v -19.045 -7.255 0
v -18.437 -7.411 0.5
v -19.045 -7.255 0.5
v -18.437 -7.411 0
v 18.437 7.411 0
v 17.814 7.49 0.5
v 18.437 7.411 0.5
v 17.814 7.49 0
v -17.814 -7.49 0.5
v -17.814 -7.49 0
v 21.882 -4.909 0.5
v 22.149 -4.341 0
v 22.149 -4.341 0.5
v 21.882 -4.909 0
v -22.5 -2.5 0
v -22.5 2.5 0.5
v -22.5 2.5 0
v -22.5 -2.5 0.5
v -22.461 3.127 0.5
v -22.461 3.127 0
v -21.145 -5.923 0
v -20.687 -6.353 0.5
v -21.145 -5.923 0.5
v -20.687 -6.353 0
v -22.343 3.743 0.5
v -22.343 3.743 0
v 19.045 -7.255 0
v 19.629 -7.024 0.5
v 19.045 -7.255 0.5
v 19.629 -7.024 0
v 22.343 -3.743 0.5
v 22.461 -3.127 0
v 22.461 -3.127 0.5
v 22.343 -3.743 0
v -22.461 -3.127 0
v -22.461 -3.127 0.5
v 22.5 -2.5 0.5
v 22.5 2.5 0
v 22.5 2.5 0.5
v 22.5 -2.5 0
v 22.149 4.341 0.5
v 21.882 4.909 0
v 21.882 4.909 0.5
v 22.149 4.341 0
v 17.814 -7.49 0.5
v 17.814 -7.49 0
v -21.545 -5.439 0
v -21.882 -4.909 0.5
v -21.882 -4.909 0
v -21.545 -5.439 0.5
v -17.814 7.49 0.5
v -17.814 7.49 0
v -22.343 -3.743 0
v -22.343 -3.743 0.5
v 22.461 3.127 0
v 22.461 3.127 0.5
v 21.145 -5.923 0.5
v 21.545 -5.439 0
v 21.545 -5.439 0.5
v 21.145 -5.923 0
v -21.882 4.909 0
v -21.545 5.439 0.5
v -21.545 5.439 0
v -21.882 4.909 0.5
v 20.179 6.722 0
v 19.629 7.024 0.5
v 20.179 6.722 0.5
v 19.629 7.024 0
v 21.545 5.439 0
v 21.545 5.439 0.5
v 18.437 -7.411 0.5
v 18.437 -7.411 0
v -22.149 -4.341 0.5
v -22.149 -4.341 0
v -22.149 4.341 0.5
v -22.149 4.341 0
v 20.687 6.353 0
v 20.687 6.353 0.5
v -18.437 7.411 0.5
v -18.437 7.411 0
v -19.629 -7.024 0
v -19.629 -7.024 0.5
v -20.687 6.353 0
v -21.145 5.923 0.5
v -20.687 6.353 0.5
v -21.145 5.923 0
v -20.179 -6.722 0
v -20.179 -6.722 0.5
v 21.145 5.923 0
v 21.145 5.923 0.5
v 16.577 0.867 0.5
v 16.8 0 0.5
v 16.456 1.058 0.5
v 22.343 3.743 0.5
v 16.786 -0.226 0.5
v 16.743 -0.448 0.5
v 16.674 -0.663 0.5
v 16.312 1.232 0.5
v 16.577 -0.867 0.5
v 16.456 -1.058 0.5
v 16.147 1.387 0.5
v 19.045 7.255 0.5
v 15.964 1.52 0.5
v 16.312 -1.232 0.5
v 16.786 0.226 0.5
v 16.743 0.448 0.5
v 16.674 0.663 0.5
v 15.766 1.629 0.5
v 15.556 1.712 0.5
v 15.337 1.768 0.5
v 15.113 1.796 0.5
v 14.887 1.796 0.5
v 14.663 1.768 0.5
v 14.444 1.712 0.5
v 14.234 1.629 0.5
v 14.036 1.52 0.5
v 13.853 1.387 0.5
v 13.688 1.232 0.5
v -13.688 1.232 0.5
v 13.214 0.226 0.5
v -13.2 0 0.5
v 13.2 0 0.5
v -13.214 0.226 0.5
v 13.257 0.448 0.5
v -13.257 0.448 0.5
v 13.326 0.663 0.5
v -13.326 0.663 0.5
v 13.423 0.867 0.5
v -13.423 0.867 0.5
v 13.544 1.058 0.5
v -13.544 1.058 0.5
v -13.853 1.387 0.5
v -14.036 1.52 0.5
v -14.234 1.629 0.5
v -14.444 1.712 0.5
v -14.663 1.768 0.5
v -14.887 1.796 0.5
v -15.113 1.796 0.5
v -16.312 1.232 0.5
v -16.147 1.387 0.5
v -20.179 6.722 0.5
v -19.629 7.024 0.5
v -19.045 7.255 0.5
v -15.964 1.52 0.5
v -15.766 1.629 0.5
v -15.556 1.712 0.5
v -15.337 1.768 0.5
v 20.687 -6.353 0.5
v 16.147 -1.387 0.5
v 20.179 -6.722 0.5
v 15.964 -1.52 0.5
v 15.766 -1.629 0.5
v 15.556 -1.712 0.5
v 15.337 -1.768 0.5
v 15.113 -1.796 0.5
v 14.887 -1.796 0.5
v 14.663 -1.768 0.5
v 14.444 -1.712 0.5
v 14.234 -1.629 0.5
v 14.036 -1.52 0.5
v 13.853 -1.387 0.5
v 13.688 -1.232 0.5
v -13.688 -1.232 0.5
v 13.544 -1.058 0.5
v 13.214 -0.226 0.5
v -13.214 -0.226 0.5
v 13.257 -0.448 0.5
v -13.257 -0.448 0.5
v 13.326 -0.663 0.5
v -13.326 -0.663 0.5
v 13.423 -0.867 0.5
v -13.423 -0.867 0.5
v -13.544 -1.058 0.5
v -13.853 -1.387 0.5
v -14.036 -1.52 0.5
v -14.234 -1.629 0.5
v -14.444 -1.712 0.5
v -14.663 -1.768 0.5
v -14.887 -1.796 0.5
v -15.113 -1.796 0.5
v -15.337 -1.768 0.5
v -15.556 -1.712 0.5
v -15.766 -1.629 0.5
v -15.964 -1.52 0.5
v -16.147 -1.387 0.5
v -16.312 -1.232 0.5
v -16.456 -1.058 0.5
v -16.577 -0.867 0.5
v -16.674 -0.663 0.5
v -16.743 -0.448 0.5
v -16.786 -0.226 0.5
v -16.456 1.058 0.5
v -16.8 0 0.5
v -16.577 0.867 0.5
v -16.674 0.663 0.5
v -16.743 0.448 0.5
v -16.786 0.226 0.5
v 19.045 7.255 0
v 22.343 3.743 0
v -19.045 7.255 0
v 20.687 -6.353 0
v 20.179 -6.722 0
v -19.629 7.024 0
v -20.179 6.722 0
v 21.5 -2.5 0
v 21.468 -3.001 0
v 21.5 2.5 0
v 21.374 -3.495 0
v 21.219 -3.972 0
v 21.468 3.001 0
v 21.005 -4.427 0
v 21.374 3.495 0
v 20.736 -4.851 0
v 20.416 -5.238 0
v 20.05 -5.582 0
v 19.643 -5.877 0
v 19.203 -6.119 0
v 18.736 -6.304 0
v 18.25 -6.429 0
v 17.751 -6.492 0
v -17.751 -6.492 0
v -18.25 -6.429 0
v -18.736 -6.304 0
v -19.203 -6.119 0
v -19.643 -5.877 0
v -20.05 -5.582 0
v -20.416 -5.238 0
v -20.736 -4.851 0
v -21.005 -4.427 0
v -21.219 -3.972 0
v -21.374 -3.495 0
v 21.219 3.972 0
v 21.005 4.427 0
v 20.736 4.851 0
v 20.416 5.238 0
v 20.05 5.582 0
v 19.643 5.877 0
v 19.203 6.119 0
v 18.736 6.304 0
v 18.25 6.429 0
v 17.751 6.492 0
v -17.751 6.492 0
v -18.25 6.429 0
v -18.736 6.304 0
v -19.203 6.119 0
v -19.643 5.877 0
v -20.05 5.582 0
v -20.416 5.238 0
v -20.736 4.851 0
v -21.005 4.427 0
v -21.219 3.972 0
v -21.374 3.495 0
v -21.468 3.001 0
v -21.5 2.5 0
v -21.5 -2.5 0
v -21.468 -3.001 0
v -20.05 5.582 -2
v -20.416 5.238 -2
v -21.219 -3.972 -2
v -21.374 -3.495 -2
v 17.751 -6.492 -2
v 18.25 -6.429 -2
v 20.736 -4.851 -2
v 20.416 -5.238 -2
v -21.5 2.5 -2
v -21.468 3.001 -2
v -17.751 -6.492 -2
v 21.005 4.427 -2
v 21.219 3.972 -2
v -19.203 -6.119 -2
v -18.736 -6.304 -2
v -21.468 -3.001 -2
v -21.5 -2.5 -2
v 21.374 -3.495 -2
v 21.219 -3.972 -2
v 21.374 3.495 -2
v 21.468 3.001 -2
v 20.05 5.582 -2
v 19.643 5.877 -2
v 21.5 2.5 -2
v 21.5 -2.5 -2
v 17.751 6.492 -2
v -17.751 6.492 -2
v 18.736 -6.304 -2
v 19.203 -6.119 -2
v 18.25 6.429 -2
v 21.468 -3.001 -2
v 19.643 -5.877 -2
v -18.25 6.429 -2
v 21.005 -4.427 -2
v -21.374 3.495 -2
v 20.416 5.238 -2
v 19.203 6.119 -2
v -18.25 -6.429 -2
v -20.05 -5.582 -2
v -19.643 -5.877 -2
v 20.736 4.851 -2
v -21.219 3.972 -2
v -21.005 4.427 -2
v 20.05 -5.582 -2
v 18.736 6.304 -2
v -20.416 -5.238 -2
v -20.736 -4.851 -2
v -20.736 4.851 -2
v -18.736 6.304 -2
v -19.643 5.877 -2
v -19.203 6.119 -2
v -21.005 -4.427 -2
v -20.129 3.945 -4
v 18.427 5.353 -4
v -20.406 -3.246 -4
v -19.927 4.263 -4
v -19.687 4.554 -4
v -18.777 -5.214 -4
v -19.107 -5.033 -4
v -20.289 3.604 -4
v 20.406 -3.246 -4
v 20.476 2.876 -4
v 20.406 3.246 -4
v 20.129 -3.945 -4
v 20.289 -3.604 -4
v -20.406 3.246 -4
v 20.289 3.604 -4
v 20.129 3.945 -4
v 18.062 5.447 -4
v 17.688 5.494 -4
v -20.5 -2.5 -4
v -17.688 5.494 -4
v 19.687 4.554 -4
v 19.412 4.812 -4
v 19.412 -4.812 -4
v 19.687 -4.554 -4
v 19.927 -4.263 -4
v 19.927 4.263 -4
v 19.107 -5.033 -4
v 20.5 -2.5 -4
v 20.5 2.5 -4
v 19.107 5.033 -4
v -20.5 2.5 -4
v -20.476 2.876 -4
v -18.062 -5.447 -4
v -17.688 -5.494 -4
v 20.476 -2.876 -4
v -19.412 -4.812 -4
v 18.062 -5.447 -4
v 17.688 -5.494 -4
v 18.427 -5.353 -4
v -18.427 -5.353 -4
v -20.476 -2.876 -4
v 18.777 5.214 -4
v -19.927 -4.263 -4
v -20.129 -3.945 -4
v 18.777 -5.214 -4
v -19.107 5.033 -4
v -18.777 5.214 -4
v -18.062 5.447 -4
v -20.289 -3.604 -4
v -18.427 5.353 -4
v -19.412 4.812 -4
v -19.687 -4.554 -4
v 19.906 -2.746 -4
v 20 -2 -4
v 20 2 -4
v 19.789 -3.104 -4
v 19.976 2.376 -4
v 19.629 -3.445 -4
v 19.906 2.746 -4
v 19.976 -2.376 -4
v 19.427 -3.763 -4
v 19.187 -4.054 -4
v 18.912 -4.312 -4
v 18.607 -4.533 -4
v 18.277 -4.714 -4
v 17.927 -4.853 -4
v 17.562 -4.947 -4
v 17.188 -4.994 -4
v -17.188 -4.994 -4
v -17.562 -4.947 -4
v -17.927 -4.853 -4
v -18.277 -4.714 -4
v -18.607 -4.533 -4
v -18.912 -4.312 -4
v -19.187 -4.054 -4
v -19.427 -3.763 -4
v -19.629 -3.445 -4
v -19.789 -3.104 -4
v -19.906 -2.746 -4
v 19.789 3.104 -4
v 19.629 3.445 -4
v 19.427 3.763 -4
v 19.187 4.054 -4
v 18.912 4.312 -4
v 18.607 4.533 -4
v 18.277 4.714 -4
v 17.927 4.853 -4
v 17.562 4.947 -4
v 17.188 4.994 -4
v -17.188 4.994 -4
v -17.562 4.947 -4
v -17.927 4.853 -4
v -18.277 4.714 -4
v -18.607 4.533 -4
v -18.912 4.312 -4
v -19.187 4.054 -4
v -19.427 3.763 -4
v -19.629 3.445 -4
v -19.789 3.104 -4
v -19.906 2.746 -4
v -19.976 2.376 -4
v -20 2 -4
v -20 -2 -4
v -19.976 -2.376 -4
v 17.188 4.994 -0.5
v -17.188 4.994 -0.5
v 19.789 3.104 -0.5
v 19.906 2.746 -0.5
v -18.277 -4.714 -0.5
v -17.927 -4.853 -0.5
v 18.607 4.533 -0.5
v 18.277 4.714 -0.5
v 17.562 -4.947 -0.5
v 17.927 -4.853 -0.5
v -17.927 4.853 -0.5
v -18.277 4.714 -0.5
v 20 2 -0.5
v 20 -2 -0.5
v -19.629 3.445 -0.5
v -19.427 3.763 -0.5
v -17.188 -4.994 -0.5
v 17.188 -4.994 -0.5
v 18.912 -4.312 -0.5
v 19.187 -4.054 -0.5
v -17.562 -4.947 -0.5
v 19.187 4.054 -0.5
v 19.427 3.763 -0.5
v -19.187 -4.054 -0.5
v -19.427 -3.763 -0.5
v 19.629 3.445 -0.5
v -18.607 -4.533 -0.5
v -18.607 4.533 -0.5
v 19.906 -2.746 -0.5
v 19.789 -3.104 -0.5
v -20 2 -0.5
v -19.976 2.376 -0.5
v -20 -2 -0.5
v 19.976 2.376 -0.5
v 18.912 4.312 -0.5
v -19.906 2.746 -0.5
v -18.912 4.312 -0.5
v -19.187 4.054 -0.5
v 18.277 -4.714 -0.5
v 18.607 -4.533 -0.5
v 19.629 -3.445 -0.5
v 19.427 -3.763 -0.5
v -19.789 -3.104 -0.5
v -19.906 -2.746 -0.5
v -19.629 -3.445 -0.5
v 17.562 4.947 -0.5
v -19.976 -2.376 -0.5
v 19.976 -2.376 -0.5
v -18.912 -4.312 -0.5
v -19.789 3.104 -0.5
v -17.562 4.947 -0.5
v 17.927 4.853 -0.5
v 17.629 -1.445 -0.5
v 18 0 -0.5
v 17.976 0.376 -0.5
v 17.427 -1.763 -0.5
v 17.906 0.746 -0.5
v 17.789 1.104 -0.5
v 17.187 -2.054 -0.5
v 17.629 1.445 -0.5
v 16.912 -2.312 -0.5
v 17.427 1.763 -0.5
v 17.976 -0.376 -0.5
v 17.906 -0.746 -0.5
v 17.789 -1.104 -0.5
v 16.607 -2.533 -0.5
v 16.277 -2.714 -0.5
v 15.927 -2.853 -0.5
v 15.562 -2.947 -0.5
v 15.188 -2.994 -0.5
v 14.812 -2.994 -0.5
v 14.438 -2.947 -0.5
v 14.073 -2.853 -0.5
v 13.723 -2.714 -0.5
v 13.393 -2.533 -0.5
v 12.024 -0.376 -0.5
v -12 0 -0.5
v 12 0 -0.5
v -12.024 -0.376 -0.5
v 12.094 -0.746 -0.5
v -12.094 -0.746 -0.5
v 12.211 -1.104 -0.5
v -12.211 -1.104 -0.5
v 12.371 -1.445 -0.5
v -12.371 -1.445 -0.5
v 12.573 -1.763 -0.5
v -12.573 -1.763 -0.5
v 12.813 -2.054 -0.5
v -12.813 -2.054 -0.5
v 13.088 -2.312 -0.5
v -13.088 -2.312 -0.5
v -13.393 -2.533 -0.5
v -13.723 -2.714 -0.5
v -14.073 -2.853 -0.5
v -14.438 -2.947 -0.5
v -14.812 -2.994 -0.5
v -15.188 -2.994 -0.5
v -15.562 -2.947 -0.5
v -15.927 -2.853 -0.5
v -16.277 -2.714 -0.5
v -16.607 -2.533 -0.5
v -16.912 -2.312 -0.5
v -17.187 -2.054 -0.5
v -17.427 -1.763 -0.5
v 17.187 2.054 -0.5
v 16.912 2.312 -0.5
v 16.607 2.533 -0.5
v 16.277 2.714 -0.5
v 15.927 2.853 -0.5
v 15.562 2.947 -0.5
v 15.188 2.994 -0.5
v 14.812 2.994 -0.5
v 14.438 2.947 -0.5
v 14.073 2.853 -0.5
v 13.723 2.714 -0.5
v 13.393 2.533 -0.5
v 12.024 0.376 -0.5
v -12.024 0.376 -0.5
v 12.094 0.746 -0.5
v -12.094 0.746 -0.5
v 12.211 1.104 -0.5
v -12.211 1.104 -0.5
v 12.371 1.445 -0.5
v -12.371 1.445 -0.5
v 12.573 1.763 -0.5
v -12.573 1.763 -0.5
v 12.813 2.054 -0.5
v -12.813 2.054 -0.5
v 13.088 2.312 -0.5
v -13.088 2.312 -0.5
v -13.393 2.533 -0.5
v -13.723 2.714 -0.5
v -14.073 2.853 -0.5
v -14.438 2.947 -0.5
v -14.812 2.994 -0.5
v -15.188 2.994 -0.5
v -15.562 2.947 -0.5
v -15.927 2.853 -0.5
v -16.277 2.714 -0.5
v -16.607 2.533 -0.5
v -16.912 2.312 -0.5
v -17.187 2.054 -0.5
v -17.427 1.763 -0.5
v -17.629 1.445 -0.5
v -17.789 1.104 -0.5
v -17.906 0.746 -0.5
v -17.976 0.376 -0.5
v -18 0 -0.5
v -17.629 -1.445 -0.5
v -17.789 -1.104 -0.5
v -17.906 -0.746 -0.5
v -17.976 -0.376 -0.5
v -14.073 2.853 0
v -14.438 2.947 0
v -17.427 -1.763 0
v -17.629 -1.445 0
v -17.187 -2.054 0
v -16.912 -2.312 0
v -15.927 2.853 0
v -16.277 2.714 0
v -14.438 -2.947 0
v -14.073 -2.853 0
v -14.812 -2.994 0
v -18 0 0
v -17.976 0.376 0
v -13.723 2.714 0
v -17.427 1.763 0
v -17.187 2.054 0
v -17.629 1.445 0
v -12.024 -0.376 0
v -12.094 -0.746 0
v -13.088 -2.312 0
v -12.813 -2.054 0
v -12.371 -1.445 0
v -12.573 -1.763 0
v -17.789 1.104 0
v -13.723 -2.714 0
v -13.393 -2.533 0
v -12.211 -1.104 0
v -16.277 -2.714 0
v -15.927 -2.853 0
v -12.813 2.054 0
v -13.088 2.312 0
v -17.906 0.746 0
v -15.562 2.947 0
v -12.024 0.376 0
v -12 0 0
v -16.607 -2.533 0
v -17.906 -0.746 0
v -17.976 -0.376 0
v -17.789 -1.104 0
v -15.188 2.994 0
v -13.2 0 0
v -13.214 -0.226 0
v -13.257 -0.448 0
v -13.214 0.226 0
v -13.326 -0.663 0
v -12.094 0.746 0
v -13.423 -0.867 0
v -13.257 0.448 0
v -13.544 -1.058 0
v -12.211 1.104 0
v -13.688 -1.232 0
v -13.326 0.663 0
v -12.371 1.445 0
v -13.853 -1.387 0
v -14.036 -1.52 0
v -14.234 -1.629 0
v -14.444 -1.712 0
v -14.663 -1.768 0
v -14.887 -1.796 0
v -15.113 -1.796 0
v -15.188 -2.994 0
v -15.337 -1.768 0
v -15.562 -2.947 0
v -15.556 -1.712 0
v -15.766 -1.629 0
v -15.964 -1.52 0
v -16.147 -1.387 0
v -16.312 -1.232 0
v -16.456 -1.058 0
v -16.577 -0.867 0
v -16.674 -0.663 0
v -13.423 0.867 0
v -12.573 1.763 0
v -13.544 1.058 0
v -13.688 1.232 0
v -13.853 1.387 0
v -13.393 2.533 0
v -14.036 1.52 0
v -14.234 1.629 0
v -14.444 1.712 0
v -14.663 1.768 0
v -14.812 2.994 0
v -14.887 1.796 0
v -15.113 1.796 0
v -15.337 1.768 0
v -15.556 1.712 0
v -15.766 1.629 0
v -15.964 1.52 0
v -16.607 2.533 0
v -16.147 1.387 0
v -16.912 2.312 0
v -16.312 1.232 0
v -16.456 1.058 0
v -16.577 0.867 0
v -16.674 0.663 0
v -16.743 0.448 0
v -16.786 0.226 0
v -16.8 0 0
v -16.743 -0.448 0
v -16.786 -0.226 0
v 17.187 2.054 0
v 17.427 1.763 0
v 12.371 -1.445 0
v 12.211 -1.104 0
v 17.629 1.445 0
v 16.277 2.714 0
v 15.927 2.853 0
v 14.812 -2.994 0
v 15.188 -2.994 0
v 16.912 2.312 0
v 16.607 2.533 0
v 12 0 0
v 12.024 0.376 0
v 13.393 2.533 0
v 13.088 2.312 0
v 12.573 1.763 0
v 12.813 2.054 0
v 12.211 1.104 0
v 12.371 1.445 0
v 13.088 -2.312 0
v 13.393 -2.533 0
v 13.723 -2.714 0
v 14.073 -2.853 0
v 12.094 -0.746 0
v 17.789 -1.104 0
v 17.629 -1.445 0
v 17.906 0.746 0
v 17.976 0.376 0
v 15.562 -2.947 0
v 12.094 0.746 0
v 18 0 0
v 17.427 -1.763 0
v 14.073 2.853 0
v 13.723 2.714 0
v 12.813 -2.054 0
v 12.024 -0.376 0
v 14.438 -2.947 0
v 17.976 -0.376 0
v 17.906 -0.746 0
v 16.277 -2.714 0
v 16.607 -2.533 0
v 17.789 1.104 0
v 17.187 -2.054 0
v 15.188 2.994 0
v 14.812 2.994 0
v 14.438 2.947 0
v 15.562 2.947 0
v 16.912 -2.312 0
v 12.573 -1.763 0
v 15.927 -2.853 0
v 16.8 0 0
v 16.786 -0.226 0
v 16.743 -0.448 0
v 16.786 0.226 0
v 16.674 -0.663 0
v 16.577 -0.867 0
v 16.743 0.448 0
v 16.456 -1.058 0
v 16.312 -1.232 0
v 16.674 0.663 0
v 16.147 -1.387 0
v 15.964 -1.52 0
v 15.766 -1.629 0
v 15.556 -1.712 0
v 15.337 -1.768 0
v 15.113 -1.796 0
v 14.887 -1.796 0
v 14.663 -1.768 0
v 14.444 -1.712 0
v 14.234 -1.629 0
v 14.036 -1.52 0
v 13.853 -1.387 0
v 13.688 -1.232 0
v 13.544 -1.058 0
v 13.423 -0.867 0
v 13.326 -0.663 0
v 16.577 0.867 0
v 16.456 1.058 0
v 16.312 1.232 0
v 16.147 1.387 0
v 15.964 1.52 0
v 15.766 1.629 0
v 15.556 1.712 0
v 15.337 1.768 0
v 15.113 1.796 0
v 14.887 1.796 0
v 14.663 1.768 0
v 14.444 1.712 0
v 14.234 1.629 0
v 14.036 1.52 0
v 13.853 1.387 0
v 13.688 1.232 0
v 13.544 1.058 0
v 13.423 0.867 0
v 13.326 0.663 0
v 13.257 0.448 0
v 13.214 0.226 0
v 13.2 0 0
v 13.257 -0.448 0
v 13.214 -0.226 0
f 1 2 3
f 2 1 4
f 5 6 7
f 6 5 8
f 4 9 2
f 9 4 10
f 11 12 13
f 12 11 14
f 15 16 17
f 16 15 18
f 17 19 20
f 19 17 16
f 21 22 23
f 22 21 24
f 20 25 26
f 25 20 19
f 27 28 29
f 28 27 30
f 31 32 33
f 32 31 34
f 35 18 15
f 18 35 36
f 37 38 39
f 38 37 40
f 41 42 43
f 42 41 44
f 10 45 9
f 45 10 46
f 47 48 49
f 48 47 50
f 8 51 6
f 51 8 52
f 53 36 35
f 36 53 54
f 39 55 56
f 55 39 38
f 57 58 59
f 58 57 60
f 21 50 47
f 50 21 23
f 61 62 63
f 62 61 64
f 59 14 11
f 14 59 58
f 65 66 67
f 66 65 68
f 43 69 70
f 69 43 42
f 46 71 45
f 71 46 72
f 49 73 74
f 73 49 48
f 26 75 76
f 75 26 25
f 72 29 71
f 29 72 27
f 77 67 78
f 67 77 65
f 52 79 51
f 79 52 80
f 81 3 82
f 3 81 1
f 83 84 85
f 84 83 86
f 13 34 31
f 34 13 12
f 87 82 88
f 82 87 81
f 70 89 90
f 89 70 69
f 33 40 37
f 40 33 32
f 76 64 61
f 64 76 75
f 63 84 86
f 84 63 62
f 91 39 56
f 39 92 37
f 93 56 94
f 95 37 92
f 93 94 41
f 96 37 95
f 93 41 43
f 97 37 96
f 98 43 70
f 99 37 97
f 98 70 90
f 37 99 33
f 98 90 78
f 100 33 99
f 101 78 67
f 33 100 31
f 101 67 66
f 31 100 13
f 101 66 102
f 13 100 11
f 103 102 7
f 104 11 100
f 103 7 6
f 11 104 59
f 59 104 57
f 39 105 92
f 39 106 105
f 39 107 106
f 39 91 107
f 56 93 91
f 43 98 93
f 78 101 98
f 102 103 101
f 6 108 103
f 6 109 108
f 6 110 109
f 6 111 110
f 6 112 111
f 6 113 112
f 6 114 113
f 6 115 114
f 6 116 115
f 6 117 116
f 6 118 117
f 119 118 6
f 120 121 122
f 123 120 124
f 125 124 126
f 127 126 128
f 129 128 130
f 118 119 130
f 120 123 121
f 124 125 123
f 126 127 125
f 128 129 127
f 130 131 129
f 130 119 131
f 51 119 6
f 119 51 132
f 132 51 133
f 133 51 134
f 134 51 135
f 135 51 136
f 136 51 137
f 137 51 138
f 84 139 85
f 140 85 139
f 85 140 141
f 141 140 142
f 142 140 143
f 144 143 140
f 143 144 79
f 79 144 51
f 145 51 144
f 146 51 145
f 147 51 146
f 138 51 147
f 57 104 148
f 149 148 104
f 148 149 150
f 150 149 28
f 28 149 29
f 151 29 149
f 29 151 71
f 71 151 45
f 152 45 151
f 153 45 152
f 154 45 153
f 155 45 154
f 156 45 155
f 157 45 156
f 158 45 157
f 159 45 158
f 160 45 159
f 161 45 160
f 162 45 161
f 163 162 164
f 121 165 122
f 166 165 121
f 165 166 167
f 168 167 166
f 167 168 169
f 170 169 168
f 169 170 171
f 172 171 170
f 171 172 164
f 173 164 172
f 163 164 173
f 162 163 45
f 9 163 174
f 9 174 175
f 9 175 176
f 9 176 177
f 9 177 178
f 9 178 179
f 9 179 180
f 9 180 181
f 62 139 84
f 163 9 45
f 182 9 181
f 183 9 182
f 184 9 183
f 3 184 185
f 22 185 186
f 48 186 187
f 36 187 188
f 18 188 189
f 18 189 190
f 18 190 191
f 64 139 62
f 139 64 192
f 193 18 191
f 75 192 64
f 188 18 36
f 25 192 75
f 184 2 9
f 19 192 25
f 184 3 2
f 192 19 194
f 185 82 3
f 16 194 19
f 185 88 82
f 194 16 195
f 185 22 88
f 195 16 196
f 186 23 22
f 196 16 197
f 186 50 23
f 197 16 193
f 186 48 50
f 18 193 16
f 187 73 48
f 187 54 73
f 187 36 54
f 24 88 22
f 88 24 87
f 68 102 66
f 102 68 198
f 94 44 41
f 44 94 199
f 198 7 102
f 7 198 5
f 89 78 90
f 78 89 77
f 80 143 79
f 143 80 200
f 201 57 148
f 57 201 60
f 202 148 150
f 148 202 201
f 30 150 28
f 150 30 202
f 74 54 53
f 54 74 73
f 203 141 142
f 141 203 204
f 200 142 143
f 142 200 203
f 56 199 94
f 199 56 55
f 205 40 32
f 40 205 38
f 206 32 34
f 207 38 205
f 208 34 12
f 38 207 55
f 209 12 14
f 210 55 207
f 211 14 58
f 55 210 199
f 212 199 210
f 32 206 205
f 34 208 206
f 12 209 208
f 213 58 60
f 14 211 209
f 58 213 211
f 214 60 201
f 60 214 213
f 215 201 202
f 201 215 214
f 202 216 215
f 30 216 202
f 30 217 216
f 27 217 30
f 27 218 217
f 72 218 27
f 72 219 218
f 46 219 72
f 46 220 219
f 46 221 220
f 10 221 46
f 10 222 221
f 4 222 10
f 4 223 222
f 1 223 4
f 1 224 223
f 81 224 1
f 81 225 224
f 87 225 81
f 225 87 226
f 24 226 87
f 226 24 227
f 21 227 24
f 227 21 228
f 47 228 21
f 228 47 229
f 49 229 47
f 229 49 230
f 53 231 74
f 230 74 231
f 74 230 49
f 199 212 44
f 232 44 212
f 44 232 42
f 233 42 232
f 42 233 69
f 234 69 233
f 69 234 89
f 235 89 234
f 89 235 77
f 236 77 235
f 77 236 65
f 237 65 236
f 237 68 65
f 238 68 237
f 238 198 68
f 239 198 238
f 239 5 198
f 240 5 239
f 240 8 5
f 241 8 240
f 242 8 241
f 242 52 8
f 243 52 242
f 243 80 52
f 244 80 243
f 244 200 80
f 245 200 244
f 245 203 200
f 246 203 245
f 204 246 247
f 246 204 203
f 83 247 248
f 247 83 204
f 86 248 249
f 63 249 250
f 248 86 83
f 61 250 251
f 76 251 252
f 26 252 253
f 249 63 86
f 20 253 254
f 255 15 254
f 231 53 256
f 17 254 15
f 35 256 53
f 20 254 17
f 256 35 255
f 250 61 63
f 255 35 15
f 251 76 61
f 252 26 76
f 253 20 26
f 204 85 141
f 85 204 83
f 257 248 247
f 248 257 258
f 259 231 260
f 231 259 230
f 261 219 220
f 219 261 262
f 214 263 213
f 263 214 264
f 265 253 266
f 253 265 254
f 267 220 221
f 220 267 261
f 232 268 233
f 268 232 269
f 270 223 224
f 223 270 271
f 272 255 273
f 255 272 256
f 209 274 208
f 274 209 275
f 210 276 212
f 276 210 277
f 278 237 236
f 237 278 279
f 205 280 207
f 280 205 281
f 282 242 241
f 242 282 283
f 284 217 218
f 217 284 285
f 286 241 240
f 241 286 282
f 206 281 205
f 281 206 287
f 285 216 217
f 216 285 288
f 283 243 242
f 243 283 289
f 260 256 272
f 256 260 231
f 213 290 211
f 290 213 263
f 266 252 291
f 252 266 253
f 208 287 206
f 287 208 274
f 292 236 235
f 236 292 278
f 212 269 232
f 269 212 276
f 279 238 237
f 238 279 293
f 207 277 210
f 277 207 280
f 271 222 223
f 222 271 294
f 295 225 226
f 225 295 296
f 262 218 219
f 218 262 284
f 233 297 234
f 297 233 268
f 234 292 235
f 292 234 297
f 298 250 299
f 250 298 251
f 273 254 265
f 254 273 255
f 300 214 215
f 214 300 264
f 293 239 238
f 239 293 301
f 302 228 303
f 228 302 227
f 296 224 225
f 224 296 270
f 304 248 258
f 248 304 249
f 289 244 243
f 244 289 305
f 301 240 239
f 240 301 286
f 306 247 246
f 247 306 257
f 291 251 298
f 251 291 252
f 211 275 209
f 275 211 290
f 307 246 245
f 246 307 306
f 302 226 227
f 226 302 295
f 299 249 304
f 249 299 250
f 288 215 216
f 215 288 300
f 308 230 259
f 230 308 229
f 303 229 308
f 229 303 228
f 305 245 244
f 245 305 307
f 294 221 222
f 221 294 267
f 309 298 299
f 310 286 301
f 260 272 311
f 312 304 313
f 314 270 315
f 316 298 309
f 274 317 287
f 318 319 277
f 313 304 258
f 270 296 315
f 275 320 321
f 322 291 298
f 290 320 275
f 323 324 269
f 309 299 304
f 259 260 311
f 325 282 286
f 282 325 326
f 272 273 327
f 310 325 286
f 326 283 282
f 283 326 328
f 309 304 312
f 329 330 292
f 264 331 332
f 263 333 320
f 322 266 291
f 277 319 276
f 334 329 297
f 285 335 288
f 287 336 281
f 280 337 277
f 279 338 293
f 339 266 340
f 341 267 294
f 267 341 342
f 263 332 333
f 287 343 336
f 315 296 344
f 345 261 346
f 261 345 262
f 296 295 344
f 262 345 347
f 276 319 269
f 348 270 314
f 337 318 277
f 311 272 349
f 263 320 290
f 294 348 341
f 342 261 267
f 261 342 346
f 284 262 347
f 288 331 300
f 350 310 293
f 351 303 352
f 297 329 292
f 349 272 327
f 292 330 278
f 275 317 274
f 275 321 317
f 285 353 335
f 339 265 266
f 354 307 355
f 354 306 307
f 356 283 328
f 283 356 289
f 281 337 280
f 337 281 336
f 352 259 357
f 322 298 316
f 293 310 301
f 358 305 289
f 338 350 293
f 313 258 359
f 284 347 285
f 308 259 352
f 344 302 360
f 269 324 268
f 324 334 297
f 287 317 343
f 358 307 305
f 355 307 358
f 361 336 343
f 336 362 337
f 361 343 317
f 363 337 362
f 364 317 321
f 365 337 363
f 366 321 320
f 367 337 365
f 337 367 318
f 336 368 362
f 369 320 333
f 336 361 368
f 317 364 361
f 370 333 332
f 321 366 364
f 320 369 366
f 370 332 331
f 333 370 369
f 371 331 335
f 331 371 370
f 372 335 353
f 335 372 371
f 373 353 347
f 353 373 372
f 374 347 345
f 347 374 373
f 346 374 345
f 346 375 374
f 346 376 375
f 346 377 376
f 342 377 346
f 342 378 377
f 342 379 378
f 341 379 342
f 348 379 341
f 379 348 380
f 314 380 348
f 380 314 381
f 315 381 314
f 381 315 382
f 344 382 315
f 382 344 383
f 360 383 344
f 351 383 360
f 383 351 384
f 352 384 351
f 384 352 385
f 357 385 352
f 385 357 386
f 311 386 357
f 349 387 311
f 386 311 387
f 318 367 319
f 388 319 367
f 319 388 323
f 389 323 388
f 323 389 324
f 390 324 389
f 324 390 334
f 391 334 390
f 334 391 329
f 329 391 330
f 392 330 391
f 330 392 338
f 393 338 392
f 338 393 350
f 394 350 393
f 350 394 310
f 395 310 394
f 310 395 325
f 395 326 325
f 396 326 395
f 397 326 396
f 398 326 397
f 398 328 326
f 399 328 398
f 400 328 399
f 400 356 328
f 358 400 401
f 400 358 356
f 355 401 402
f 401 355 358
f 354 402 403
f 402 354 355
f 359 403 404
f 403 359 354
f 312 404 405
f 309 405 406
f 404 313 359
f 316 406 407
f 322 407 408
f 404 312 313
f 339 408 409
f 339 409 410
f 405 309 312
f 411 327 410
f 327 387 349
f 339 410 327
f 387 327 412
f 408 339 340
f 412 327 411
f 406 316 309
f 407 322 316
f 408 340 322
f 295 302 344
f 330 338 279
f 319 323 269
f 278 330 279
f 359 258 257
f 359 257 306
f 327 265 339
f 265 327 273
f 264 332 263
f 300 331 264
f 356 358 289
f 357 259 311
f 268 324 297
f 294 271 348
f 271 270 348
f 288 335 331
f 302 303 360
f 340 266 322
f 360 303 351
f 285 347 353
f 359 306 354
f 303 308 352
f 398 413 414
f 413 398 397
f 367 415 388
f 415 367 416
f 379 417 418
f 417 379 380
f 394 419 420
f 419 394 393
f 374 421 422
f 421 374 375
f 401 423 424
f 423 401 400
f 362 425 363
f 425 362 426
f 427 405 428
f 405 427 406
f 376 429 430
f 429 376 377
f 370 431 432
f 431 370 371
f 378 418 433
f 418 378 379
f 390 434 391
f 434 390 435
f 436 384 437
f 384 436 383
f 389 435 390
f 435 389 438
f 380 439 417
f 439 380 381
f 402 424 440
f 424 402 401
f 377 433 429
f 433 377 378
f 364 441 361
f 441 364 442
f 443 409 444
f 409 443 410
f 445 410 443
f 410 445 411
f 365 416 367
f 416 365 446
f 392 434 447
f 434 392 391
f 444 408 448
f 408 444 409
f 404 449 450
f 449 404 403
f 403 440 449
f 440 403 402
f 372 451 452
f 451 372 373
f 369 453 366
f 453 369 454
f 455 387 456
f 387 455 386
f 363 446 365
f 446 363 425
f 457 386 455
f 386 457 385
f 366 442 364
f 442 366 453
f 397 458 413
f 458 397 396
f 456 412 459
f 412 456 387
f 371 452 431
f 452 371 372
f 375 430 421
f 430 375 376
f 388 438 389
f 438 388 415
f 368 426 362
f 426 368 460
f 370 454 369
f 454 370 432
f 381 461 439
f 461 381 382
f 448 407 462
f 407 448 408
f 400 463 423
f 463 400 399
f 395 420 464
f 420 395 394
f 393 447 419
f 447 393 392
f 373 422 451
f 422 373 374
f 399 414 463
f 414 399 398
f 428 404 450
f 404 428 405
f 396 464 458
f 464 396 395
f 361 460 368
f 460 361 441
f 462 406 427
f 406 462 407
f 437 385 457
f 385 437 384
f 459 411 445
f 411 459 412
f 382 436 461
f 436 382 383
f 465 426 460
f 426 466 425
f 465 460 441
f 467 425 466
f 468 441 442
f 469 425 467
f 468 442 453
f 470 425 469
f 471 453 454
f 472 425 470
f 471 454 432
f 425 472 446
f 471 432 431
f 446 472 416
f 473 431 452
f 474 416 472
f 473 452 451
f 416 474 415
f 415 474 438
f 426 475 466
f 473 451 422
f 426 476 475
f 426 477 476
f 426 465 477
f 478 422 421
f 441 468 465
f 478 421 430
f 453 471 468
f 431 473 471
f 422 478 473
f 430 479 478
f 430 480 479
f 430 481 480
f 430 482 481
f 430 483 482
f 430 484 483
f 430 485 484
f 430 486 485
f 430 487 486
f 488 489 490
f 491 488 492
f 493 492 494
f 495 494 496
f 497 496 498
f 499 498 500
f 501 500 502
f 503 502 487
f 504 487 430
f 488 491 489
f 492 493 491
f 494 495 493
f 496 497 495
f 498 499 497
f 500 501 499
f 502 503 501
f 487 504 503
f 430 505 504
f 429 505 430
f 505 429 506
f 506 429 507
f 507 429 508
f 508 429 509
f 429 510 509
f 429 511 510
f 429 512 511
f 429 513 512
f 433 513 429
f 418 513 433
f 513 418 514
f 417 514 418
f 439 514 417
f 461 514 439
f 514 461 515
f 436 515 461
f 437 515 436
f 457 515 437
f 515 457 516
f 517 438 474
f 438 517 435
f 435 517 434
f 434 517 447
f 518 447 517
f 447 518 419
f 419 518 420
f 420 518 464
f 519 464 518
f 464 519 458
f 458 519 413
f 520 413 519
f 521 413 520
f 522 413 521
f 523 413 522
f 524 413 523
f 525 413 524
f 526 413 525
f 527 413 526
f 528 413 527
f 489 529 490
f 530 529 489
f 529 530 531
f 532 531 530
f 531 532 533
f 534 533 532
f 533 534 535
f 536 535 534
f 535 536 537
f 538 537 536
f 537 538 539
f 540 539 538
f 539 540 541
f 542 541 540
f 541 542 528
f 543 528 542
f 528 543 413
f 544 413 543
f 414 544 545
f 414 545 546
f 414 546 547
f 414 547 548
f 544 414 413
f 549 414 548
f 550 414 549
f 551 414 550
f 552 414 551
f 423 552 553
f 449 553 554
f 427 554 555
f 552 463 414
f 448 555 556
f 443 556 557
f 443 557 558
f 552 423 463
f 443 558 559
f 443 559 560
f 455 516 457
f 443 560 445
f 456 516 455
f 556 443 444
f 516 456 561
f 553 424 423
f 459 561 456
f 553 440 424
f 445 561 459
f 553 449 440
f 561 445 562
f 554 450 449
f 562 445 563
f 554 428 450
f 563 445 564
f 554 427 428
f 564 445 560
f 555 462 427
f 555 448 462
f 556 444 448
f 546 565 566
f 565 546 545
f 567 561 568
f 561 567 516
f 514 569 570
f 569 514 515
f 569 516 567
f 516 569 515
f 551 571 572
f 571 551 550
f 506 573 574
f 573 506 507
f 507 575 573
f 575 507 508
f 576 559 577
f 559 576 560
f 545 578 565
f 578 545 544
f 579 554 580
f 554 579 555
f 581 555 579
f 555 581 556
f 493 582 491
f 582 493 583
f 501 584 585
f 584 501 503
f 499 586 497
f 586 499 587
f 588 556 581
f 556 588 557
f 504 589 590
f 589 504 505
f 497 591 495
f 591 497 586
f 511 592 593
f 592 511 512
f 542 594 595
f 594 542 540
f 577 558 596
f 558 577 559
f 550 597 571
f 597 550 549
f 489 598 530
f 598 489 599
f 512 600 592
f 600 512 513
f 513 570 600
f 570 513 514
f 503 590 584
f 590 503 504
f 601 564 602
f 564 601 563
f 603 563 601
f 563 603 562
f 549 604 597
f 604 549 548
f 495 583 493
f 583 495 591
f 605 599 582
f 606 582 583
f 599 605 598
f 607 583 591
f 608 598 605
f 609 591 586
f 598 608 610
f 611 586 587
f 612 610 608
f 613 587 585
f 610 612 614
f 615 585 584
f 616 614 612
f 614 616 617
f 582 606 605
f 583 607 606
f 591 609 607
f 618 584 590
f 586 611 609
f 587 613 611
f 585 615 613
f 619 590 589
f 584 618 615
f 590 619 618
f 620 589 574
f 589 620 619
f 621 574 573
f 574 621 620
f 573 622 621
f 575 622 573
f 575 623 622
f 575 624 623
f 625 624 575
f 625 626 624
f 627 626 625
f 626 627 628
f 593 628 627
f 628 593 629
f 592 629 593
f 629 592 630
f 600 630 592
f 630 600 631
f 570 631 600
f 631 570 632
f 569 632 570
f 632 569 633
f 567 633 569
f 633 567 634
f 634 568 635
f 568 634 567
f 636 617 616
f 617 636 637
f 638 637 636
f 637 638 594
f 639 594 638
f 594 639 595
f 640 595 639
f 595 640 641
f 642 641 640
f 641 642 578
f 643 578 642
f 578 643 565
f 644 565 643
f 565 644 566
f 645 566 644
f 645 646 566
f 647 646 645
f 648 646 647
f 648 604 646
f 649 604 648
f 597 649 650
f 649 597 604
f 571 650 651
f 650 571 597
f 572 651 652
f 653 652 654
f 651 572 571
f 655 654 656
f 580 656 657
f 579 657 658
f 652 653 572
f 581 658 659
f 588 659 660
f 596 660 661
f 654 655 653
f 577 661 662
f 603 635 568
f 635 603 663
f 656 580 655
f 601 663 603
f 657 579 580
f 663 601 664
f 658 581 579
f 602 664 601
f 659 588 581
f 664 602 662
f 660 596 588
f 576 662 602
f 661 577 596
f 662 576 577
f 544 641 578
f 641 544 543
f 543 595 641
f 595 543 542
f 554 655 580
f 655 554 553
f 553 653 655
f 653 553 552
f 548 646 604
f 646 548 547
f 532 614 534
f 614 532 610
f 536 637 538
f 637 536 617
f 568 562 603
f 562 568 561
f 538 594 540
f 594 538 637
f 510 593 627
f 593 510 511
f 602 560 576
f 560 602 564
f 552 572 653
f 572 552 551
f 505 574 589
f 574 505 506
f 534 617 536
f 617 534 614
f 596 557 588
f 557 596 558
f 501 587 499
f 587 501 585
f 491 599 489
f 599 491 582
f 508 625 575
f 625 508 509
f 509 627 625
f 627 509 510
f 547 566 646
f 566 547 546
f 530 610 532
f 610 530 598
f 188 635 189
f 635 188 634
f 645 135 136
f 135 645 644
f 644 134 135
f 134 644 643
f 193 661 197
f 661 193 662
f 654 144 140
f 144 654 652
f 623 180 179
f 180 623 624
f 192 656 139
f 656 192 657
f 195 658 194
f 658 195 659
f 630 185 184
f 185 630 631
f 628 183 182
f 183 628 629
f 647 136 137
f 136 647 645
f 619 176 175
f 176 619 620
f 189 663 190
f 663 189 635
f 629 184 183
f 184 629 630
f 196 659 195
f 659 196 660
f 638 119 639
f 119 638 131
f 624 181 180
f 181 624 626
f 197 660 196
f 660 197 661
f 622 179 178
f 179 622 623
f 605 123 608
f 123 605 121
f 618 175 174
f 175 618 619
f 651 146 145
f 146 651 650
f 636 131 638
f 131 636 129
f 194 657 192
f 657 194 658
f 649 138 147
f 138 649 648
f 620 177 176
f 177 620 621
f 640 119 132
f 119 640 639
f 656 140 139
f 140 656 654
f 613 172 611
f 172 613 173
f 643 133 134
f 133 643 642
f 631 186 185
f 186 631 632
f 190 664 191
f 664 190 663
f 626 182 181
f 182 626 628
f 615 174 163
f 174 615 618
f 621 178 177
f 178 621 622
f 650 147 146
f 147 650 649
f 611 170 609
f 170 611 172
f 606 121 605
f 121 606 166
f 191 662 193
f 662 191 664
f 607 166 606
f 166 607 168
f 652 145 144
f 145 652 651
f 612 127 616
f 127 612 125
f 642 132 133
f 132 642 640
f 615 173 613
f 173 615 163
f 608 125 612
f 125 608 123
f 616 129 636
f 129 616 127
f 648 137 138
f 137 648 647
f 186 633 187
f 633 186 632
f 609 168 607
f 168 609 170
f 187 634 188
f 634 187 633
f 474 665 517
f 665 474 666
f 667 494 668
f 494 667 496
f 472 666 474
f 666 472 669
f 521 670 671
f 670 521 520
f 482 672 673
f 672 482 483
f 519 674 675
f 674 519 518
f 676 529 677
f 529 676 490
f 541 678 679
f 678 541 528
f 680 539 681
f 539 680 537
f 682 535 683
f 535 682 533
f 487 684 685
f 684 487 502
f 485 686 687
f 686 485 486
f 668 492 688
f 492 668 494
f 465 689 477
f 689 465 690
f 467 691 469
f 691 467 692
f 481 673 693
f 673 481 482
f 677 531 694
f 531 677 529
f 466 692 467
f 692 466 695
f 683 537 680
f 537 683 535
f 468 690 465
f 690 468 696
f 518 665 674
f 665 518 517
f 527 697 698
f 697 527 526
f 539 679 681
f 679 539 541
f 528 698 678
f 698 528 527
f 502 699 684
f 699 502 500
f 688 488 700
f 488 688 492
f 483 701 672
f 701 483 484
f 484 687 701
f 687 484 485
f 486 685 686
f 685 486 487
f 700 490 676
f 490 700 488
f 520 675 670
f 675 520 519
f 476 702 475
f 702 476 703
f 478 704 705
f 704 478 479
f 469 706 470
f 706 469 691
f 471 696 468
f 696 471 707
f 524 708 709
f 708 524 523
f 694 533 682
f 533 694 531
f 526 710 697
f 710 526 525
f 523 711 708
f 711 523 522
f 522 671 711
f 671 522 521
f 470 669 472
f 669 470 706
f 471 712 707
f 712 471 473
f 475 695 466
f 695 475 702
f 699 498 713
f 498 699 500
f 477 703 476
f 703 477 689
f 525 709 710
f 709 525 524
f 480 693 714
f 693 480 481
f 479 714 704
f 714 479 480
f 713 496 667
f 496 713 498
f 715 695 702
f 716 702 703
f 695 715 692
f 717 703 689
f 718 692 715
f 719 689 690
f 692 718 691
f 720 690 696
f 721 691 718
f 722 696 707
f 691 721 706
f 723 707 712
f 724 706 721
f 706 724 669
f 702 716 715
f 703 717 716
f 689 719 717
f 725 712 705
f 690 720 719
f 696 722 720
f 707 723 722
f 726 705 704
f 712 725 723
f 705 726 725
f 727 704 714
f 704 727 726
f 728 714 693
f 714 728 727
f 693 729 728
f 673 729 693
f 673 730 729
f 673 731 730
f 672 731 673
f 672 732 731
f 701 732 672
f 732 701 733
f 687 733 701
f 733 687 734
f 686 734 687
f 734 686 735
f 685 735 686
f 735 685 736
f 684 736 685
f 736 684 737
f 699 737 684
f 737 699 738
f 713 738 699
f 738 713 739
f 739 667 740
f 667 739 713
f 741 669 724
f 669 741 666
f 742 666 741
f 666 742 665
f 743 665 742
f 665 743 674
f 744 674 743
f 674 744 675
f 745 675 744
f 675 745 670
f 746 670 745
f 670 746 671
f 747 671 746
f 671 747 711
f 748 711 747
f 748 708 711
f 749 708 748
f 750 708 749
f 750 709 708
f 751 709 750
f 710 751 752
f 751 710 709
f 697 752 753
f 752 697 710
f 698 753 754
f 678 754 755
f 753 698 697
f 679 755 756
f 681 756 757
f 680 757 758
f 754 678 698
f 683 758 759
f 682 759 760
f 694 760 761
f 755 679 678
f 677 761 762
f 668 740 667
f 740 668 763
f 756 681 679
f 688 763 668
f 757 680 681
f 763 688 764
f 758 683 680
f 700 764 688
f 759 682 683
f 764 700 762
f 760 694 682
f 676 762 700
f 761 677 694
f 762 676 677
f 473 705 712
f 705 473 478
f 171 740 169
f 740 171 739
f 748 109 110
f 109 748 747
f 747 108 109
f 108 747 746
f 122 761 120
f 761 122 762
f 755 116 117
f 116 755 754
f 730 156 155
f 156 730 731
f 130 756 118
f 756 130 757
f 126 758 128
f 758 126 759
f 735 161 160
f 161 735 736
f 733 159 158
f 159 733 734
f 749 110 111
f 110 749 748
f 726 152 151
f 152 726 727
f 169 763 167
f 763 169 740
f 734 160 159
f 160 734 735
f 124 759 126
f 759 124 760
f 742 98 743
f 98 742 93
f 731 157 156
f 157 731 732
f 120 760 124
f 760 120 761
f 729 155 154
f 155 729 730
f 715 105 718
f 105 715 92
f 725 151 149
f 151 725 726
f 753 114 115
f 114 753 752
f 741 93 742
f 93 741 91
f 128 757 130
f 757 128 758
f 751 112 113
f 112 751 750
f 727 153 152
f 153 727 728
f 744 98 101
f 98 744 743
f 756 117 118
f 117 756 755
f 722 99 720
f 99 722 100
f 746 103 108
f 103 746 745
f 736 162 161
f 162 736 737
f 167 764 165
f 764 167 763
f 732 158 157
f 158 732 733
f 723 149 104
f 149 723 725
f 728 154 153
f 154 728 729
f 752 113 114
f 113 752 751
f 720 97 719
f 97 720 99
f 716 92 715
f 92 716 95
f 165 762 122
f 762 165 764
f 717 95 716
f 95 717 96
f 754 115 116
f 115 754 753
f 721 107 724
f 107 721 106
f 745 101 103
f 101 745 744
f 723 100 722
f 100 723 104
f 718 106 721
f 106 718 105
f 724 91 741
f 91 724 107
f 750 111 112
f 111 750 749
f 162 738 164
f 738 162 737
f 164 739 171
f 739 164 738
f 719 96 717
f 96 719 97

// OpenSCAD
$fn = 50;


difference() {
	union() {
		translate(v = [0, 0, 0]) {
			rotate(a = [0, 0, 0]) {
				hull() {
					translate(v = [-17.5000000000, 2.5000000000, 0]) {
						rotate(a = [0, 0, 0]) {
							translate(v = [0, 0, 0]) {
								rotate(a = [0, 0, 0]) {
									cylinder(h = 0.5000000000, r = 5);
								}
							}
						}
					}
					translate(v = [17.5000000000, 2.5000000000, 0]) {
						rotate(a = [0, 0, 0]) {
							translate(v = [0, 0, 0]) {
								rotate(a = [0, 0, 0]) {
									cylinder(h = 0.5000000000, r = 5);
								}
							}
						}
					}
					translate(v = [-17.5000000000, -2.5000000000, 0]) {
						rotate(a = [0, 0, 0]) {
							translate(v = [0, 0, 0]) {
								rotate(a = [0, 0, 0]) {
									cylinder(h = 0.5000000000, r = 5);
								}
							}
						}
					}
					translate(v = [17.5000000000, -2.5000000000, 0]) {
						rotate(a = [0, 0, 0]) {
							translate(v = [0, 0, 0]) {
								rotate(a = [0, 0, 0]) {
									cylinder(h = 0.5000000000, r = 5);
								}
							}
						}
					}
				}
			}
		}
		translate(v = [0, 0, -2]) {
			rotate(a = [0, 0, 0]) {
				hull() {
					translate(v = [-17.5000000000, 2.5000000000, 0]) {
						rotate(a = [0, 0, 0]) {
							cylinder(h = 2, r1 = 4.0000000000, r2 = 4.0000000000);
						}
					}
					translate(v = [17.5000000000, 2.5000000000, 0]) {
						rotate(a = [0, 0, 0]) {
							cylinder(h = 2, r1 = 4.0000000000, r2 = 4.0000000000);
						}
					}
					translate(v = [-17.5000000000, -2.5000000000, 0]) {
						rotate(a = [0, 0, 0]) {
							cylinder(h = 2, r1 = 4.0000000000, r2 = 4.0000000000);
						}
					}
					translate(v = [17.5000000000, -2.5000000000, 0]) {
						rotate(a = [0, 0, 0]) {
							cylinder(h = 2, r1 = 4.0000000000, r2 = 4.0000000000);
						}
					}
				}
			}
		}
		translate(v = [0, 0, -4]) {
			rotate(a = [0, 180, 0]) {
				hull() {
					translate(v = [-17.5000000000, 2.5000000000, 0]) {
						rotate(a = [0, 180, 0]) {
							cylinder(h = 2, r1 = 3.0000000000, r2 = 4.0000000000);
						}
					}
					translate(v = [17.5000000000, 2.5000000000, 0]) {
						rotate(a = [0, 180, 0]) {
							cylinder(h = 2, r1 = 3.0000000000, r2 = 4.0000000000);
						}
					}
					translate(v = [-17.5000000000, -2.5000000000, 0]) {
						rotate(a = [0, 180, 0]) {
							cylinder(h = 2, r1 = 3.0000000000, r2 = 4.0000000000);
						}
					}
					translate(v = [17.5000000000, -2.5000000000, 0]) {
						rotate(a = [0, 180, 0]) {
							cylinder(h = 2, r1 = 3.0000000000, r2 = 4.0000000000);
						}
					}
				}
			}
		}
	}
	union() {
		translate(v = [0, 0, -4]) {
			rotate(a = [0, 0, 0]) {
				hull() {
					translate(v = [-17.0000000000, 2.0000000000, 0]) {
						rotate(a = [0, 0, 0]) {
							translate(v = [0, 0, 0]) {
								rotate(a = [0, 0, 0]) {
									cylinder(h = 3.5000000000, r = 3.0000000000);
								}
							}
						}
					}
					translate(v = [17.0000000000, 2.0000000000, 0]) {
						rotate(a = [0, 0, 0]) {
							translate(v = [0, 0, 0]) {
								rotate(a = [0, 0, 0]) {
									cylinder(h = 3.5000000000, r = 3.0000000000);
								}
							}
						}
					}
					translate(v = [-17.0000000000, -2.0000000000, 0]) {
						rotate(a = [0, 0, 0]) {
							translate(v = [0, 0, 0]) {
								rotate(a = [0, 0, 0]) {
									cylinder(h = 3.5000000000, r = 3.0000000000);
								}
							}
						}
					}
					translate(v = [17.0000000000, -2.0000000000, 0]) {
						rotate(a = [0, 0, 0]) {
							translate(v = [0, 0, 0]) {
								rotate(a = [0, 0, 0]) {
									cylinder(h = 3.5000000000, r = 3.0000000000);
								}
							}
						}
					}
				}
			}
		}
		#translate(v = [-15.0000000000, 0.0000000000, 0]) {
			rotate(a = [0, 180, 0]) {
				cylinder(h = 3.2000000000, r = 3.0000000000);
			}
		}
		#translate(v = [-15.0000000000, 0.0000000000, 10]) {
			rotate(a = [0, 180, 0]) {
				cylinder(h = 10, r = 1.8000000000);
			}
		}
		#translate(v = [15.0000000000, 0.0000000000, 0]) {
			rotate(a = [0, 180, 0]) {
				cylinder(h = 3.2000000000, r = 3.0000000000);
			}
		}
		#translate(v = [15.0000000000, 0.0000000000, 10]) {
			rotate(a = [0, 180, 0]) {
				cylinder(h = 10, r = 1.8000000000);
			}
		}
		#translate(v = [-15.0000000000, 0.0000000000, 0]) {
			rotate(a = [0, 180, 0]) {
				cylinder(h = 3.2000000000, r = 3.0000000000);
			}
		}
		#translate(v = [-15.0000000000, 0.0000000000, 10]) {
			rotate(a = [0, 180, 0]) {
				cylinder(h = 10, r = 1.8000000000);
			}
		}
		#translate(v = [15.0000000000, 0.0000000000, 0]) {
			rotate(a = [0, 180, 0]) {
				cylinder(h = 3.2000000000, r = 3.0000000000);
			}
		}
		#translate(v = [15.0000000000, 0.0000000000, 10]) {
			rotate(a = [0, 180, 0]) {
				cylinder(h = 10, r = 1.8000000000);
			}
		}
	}
}
